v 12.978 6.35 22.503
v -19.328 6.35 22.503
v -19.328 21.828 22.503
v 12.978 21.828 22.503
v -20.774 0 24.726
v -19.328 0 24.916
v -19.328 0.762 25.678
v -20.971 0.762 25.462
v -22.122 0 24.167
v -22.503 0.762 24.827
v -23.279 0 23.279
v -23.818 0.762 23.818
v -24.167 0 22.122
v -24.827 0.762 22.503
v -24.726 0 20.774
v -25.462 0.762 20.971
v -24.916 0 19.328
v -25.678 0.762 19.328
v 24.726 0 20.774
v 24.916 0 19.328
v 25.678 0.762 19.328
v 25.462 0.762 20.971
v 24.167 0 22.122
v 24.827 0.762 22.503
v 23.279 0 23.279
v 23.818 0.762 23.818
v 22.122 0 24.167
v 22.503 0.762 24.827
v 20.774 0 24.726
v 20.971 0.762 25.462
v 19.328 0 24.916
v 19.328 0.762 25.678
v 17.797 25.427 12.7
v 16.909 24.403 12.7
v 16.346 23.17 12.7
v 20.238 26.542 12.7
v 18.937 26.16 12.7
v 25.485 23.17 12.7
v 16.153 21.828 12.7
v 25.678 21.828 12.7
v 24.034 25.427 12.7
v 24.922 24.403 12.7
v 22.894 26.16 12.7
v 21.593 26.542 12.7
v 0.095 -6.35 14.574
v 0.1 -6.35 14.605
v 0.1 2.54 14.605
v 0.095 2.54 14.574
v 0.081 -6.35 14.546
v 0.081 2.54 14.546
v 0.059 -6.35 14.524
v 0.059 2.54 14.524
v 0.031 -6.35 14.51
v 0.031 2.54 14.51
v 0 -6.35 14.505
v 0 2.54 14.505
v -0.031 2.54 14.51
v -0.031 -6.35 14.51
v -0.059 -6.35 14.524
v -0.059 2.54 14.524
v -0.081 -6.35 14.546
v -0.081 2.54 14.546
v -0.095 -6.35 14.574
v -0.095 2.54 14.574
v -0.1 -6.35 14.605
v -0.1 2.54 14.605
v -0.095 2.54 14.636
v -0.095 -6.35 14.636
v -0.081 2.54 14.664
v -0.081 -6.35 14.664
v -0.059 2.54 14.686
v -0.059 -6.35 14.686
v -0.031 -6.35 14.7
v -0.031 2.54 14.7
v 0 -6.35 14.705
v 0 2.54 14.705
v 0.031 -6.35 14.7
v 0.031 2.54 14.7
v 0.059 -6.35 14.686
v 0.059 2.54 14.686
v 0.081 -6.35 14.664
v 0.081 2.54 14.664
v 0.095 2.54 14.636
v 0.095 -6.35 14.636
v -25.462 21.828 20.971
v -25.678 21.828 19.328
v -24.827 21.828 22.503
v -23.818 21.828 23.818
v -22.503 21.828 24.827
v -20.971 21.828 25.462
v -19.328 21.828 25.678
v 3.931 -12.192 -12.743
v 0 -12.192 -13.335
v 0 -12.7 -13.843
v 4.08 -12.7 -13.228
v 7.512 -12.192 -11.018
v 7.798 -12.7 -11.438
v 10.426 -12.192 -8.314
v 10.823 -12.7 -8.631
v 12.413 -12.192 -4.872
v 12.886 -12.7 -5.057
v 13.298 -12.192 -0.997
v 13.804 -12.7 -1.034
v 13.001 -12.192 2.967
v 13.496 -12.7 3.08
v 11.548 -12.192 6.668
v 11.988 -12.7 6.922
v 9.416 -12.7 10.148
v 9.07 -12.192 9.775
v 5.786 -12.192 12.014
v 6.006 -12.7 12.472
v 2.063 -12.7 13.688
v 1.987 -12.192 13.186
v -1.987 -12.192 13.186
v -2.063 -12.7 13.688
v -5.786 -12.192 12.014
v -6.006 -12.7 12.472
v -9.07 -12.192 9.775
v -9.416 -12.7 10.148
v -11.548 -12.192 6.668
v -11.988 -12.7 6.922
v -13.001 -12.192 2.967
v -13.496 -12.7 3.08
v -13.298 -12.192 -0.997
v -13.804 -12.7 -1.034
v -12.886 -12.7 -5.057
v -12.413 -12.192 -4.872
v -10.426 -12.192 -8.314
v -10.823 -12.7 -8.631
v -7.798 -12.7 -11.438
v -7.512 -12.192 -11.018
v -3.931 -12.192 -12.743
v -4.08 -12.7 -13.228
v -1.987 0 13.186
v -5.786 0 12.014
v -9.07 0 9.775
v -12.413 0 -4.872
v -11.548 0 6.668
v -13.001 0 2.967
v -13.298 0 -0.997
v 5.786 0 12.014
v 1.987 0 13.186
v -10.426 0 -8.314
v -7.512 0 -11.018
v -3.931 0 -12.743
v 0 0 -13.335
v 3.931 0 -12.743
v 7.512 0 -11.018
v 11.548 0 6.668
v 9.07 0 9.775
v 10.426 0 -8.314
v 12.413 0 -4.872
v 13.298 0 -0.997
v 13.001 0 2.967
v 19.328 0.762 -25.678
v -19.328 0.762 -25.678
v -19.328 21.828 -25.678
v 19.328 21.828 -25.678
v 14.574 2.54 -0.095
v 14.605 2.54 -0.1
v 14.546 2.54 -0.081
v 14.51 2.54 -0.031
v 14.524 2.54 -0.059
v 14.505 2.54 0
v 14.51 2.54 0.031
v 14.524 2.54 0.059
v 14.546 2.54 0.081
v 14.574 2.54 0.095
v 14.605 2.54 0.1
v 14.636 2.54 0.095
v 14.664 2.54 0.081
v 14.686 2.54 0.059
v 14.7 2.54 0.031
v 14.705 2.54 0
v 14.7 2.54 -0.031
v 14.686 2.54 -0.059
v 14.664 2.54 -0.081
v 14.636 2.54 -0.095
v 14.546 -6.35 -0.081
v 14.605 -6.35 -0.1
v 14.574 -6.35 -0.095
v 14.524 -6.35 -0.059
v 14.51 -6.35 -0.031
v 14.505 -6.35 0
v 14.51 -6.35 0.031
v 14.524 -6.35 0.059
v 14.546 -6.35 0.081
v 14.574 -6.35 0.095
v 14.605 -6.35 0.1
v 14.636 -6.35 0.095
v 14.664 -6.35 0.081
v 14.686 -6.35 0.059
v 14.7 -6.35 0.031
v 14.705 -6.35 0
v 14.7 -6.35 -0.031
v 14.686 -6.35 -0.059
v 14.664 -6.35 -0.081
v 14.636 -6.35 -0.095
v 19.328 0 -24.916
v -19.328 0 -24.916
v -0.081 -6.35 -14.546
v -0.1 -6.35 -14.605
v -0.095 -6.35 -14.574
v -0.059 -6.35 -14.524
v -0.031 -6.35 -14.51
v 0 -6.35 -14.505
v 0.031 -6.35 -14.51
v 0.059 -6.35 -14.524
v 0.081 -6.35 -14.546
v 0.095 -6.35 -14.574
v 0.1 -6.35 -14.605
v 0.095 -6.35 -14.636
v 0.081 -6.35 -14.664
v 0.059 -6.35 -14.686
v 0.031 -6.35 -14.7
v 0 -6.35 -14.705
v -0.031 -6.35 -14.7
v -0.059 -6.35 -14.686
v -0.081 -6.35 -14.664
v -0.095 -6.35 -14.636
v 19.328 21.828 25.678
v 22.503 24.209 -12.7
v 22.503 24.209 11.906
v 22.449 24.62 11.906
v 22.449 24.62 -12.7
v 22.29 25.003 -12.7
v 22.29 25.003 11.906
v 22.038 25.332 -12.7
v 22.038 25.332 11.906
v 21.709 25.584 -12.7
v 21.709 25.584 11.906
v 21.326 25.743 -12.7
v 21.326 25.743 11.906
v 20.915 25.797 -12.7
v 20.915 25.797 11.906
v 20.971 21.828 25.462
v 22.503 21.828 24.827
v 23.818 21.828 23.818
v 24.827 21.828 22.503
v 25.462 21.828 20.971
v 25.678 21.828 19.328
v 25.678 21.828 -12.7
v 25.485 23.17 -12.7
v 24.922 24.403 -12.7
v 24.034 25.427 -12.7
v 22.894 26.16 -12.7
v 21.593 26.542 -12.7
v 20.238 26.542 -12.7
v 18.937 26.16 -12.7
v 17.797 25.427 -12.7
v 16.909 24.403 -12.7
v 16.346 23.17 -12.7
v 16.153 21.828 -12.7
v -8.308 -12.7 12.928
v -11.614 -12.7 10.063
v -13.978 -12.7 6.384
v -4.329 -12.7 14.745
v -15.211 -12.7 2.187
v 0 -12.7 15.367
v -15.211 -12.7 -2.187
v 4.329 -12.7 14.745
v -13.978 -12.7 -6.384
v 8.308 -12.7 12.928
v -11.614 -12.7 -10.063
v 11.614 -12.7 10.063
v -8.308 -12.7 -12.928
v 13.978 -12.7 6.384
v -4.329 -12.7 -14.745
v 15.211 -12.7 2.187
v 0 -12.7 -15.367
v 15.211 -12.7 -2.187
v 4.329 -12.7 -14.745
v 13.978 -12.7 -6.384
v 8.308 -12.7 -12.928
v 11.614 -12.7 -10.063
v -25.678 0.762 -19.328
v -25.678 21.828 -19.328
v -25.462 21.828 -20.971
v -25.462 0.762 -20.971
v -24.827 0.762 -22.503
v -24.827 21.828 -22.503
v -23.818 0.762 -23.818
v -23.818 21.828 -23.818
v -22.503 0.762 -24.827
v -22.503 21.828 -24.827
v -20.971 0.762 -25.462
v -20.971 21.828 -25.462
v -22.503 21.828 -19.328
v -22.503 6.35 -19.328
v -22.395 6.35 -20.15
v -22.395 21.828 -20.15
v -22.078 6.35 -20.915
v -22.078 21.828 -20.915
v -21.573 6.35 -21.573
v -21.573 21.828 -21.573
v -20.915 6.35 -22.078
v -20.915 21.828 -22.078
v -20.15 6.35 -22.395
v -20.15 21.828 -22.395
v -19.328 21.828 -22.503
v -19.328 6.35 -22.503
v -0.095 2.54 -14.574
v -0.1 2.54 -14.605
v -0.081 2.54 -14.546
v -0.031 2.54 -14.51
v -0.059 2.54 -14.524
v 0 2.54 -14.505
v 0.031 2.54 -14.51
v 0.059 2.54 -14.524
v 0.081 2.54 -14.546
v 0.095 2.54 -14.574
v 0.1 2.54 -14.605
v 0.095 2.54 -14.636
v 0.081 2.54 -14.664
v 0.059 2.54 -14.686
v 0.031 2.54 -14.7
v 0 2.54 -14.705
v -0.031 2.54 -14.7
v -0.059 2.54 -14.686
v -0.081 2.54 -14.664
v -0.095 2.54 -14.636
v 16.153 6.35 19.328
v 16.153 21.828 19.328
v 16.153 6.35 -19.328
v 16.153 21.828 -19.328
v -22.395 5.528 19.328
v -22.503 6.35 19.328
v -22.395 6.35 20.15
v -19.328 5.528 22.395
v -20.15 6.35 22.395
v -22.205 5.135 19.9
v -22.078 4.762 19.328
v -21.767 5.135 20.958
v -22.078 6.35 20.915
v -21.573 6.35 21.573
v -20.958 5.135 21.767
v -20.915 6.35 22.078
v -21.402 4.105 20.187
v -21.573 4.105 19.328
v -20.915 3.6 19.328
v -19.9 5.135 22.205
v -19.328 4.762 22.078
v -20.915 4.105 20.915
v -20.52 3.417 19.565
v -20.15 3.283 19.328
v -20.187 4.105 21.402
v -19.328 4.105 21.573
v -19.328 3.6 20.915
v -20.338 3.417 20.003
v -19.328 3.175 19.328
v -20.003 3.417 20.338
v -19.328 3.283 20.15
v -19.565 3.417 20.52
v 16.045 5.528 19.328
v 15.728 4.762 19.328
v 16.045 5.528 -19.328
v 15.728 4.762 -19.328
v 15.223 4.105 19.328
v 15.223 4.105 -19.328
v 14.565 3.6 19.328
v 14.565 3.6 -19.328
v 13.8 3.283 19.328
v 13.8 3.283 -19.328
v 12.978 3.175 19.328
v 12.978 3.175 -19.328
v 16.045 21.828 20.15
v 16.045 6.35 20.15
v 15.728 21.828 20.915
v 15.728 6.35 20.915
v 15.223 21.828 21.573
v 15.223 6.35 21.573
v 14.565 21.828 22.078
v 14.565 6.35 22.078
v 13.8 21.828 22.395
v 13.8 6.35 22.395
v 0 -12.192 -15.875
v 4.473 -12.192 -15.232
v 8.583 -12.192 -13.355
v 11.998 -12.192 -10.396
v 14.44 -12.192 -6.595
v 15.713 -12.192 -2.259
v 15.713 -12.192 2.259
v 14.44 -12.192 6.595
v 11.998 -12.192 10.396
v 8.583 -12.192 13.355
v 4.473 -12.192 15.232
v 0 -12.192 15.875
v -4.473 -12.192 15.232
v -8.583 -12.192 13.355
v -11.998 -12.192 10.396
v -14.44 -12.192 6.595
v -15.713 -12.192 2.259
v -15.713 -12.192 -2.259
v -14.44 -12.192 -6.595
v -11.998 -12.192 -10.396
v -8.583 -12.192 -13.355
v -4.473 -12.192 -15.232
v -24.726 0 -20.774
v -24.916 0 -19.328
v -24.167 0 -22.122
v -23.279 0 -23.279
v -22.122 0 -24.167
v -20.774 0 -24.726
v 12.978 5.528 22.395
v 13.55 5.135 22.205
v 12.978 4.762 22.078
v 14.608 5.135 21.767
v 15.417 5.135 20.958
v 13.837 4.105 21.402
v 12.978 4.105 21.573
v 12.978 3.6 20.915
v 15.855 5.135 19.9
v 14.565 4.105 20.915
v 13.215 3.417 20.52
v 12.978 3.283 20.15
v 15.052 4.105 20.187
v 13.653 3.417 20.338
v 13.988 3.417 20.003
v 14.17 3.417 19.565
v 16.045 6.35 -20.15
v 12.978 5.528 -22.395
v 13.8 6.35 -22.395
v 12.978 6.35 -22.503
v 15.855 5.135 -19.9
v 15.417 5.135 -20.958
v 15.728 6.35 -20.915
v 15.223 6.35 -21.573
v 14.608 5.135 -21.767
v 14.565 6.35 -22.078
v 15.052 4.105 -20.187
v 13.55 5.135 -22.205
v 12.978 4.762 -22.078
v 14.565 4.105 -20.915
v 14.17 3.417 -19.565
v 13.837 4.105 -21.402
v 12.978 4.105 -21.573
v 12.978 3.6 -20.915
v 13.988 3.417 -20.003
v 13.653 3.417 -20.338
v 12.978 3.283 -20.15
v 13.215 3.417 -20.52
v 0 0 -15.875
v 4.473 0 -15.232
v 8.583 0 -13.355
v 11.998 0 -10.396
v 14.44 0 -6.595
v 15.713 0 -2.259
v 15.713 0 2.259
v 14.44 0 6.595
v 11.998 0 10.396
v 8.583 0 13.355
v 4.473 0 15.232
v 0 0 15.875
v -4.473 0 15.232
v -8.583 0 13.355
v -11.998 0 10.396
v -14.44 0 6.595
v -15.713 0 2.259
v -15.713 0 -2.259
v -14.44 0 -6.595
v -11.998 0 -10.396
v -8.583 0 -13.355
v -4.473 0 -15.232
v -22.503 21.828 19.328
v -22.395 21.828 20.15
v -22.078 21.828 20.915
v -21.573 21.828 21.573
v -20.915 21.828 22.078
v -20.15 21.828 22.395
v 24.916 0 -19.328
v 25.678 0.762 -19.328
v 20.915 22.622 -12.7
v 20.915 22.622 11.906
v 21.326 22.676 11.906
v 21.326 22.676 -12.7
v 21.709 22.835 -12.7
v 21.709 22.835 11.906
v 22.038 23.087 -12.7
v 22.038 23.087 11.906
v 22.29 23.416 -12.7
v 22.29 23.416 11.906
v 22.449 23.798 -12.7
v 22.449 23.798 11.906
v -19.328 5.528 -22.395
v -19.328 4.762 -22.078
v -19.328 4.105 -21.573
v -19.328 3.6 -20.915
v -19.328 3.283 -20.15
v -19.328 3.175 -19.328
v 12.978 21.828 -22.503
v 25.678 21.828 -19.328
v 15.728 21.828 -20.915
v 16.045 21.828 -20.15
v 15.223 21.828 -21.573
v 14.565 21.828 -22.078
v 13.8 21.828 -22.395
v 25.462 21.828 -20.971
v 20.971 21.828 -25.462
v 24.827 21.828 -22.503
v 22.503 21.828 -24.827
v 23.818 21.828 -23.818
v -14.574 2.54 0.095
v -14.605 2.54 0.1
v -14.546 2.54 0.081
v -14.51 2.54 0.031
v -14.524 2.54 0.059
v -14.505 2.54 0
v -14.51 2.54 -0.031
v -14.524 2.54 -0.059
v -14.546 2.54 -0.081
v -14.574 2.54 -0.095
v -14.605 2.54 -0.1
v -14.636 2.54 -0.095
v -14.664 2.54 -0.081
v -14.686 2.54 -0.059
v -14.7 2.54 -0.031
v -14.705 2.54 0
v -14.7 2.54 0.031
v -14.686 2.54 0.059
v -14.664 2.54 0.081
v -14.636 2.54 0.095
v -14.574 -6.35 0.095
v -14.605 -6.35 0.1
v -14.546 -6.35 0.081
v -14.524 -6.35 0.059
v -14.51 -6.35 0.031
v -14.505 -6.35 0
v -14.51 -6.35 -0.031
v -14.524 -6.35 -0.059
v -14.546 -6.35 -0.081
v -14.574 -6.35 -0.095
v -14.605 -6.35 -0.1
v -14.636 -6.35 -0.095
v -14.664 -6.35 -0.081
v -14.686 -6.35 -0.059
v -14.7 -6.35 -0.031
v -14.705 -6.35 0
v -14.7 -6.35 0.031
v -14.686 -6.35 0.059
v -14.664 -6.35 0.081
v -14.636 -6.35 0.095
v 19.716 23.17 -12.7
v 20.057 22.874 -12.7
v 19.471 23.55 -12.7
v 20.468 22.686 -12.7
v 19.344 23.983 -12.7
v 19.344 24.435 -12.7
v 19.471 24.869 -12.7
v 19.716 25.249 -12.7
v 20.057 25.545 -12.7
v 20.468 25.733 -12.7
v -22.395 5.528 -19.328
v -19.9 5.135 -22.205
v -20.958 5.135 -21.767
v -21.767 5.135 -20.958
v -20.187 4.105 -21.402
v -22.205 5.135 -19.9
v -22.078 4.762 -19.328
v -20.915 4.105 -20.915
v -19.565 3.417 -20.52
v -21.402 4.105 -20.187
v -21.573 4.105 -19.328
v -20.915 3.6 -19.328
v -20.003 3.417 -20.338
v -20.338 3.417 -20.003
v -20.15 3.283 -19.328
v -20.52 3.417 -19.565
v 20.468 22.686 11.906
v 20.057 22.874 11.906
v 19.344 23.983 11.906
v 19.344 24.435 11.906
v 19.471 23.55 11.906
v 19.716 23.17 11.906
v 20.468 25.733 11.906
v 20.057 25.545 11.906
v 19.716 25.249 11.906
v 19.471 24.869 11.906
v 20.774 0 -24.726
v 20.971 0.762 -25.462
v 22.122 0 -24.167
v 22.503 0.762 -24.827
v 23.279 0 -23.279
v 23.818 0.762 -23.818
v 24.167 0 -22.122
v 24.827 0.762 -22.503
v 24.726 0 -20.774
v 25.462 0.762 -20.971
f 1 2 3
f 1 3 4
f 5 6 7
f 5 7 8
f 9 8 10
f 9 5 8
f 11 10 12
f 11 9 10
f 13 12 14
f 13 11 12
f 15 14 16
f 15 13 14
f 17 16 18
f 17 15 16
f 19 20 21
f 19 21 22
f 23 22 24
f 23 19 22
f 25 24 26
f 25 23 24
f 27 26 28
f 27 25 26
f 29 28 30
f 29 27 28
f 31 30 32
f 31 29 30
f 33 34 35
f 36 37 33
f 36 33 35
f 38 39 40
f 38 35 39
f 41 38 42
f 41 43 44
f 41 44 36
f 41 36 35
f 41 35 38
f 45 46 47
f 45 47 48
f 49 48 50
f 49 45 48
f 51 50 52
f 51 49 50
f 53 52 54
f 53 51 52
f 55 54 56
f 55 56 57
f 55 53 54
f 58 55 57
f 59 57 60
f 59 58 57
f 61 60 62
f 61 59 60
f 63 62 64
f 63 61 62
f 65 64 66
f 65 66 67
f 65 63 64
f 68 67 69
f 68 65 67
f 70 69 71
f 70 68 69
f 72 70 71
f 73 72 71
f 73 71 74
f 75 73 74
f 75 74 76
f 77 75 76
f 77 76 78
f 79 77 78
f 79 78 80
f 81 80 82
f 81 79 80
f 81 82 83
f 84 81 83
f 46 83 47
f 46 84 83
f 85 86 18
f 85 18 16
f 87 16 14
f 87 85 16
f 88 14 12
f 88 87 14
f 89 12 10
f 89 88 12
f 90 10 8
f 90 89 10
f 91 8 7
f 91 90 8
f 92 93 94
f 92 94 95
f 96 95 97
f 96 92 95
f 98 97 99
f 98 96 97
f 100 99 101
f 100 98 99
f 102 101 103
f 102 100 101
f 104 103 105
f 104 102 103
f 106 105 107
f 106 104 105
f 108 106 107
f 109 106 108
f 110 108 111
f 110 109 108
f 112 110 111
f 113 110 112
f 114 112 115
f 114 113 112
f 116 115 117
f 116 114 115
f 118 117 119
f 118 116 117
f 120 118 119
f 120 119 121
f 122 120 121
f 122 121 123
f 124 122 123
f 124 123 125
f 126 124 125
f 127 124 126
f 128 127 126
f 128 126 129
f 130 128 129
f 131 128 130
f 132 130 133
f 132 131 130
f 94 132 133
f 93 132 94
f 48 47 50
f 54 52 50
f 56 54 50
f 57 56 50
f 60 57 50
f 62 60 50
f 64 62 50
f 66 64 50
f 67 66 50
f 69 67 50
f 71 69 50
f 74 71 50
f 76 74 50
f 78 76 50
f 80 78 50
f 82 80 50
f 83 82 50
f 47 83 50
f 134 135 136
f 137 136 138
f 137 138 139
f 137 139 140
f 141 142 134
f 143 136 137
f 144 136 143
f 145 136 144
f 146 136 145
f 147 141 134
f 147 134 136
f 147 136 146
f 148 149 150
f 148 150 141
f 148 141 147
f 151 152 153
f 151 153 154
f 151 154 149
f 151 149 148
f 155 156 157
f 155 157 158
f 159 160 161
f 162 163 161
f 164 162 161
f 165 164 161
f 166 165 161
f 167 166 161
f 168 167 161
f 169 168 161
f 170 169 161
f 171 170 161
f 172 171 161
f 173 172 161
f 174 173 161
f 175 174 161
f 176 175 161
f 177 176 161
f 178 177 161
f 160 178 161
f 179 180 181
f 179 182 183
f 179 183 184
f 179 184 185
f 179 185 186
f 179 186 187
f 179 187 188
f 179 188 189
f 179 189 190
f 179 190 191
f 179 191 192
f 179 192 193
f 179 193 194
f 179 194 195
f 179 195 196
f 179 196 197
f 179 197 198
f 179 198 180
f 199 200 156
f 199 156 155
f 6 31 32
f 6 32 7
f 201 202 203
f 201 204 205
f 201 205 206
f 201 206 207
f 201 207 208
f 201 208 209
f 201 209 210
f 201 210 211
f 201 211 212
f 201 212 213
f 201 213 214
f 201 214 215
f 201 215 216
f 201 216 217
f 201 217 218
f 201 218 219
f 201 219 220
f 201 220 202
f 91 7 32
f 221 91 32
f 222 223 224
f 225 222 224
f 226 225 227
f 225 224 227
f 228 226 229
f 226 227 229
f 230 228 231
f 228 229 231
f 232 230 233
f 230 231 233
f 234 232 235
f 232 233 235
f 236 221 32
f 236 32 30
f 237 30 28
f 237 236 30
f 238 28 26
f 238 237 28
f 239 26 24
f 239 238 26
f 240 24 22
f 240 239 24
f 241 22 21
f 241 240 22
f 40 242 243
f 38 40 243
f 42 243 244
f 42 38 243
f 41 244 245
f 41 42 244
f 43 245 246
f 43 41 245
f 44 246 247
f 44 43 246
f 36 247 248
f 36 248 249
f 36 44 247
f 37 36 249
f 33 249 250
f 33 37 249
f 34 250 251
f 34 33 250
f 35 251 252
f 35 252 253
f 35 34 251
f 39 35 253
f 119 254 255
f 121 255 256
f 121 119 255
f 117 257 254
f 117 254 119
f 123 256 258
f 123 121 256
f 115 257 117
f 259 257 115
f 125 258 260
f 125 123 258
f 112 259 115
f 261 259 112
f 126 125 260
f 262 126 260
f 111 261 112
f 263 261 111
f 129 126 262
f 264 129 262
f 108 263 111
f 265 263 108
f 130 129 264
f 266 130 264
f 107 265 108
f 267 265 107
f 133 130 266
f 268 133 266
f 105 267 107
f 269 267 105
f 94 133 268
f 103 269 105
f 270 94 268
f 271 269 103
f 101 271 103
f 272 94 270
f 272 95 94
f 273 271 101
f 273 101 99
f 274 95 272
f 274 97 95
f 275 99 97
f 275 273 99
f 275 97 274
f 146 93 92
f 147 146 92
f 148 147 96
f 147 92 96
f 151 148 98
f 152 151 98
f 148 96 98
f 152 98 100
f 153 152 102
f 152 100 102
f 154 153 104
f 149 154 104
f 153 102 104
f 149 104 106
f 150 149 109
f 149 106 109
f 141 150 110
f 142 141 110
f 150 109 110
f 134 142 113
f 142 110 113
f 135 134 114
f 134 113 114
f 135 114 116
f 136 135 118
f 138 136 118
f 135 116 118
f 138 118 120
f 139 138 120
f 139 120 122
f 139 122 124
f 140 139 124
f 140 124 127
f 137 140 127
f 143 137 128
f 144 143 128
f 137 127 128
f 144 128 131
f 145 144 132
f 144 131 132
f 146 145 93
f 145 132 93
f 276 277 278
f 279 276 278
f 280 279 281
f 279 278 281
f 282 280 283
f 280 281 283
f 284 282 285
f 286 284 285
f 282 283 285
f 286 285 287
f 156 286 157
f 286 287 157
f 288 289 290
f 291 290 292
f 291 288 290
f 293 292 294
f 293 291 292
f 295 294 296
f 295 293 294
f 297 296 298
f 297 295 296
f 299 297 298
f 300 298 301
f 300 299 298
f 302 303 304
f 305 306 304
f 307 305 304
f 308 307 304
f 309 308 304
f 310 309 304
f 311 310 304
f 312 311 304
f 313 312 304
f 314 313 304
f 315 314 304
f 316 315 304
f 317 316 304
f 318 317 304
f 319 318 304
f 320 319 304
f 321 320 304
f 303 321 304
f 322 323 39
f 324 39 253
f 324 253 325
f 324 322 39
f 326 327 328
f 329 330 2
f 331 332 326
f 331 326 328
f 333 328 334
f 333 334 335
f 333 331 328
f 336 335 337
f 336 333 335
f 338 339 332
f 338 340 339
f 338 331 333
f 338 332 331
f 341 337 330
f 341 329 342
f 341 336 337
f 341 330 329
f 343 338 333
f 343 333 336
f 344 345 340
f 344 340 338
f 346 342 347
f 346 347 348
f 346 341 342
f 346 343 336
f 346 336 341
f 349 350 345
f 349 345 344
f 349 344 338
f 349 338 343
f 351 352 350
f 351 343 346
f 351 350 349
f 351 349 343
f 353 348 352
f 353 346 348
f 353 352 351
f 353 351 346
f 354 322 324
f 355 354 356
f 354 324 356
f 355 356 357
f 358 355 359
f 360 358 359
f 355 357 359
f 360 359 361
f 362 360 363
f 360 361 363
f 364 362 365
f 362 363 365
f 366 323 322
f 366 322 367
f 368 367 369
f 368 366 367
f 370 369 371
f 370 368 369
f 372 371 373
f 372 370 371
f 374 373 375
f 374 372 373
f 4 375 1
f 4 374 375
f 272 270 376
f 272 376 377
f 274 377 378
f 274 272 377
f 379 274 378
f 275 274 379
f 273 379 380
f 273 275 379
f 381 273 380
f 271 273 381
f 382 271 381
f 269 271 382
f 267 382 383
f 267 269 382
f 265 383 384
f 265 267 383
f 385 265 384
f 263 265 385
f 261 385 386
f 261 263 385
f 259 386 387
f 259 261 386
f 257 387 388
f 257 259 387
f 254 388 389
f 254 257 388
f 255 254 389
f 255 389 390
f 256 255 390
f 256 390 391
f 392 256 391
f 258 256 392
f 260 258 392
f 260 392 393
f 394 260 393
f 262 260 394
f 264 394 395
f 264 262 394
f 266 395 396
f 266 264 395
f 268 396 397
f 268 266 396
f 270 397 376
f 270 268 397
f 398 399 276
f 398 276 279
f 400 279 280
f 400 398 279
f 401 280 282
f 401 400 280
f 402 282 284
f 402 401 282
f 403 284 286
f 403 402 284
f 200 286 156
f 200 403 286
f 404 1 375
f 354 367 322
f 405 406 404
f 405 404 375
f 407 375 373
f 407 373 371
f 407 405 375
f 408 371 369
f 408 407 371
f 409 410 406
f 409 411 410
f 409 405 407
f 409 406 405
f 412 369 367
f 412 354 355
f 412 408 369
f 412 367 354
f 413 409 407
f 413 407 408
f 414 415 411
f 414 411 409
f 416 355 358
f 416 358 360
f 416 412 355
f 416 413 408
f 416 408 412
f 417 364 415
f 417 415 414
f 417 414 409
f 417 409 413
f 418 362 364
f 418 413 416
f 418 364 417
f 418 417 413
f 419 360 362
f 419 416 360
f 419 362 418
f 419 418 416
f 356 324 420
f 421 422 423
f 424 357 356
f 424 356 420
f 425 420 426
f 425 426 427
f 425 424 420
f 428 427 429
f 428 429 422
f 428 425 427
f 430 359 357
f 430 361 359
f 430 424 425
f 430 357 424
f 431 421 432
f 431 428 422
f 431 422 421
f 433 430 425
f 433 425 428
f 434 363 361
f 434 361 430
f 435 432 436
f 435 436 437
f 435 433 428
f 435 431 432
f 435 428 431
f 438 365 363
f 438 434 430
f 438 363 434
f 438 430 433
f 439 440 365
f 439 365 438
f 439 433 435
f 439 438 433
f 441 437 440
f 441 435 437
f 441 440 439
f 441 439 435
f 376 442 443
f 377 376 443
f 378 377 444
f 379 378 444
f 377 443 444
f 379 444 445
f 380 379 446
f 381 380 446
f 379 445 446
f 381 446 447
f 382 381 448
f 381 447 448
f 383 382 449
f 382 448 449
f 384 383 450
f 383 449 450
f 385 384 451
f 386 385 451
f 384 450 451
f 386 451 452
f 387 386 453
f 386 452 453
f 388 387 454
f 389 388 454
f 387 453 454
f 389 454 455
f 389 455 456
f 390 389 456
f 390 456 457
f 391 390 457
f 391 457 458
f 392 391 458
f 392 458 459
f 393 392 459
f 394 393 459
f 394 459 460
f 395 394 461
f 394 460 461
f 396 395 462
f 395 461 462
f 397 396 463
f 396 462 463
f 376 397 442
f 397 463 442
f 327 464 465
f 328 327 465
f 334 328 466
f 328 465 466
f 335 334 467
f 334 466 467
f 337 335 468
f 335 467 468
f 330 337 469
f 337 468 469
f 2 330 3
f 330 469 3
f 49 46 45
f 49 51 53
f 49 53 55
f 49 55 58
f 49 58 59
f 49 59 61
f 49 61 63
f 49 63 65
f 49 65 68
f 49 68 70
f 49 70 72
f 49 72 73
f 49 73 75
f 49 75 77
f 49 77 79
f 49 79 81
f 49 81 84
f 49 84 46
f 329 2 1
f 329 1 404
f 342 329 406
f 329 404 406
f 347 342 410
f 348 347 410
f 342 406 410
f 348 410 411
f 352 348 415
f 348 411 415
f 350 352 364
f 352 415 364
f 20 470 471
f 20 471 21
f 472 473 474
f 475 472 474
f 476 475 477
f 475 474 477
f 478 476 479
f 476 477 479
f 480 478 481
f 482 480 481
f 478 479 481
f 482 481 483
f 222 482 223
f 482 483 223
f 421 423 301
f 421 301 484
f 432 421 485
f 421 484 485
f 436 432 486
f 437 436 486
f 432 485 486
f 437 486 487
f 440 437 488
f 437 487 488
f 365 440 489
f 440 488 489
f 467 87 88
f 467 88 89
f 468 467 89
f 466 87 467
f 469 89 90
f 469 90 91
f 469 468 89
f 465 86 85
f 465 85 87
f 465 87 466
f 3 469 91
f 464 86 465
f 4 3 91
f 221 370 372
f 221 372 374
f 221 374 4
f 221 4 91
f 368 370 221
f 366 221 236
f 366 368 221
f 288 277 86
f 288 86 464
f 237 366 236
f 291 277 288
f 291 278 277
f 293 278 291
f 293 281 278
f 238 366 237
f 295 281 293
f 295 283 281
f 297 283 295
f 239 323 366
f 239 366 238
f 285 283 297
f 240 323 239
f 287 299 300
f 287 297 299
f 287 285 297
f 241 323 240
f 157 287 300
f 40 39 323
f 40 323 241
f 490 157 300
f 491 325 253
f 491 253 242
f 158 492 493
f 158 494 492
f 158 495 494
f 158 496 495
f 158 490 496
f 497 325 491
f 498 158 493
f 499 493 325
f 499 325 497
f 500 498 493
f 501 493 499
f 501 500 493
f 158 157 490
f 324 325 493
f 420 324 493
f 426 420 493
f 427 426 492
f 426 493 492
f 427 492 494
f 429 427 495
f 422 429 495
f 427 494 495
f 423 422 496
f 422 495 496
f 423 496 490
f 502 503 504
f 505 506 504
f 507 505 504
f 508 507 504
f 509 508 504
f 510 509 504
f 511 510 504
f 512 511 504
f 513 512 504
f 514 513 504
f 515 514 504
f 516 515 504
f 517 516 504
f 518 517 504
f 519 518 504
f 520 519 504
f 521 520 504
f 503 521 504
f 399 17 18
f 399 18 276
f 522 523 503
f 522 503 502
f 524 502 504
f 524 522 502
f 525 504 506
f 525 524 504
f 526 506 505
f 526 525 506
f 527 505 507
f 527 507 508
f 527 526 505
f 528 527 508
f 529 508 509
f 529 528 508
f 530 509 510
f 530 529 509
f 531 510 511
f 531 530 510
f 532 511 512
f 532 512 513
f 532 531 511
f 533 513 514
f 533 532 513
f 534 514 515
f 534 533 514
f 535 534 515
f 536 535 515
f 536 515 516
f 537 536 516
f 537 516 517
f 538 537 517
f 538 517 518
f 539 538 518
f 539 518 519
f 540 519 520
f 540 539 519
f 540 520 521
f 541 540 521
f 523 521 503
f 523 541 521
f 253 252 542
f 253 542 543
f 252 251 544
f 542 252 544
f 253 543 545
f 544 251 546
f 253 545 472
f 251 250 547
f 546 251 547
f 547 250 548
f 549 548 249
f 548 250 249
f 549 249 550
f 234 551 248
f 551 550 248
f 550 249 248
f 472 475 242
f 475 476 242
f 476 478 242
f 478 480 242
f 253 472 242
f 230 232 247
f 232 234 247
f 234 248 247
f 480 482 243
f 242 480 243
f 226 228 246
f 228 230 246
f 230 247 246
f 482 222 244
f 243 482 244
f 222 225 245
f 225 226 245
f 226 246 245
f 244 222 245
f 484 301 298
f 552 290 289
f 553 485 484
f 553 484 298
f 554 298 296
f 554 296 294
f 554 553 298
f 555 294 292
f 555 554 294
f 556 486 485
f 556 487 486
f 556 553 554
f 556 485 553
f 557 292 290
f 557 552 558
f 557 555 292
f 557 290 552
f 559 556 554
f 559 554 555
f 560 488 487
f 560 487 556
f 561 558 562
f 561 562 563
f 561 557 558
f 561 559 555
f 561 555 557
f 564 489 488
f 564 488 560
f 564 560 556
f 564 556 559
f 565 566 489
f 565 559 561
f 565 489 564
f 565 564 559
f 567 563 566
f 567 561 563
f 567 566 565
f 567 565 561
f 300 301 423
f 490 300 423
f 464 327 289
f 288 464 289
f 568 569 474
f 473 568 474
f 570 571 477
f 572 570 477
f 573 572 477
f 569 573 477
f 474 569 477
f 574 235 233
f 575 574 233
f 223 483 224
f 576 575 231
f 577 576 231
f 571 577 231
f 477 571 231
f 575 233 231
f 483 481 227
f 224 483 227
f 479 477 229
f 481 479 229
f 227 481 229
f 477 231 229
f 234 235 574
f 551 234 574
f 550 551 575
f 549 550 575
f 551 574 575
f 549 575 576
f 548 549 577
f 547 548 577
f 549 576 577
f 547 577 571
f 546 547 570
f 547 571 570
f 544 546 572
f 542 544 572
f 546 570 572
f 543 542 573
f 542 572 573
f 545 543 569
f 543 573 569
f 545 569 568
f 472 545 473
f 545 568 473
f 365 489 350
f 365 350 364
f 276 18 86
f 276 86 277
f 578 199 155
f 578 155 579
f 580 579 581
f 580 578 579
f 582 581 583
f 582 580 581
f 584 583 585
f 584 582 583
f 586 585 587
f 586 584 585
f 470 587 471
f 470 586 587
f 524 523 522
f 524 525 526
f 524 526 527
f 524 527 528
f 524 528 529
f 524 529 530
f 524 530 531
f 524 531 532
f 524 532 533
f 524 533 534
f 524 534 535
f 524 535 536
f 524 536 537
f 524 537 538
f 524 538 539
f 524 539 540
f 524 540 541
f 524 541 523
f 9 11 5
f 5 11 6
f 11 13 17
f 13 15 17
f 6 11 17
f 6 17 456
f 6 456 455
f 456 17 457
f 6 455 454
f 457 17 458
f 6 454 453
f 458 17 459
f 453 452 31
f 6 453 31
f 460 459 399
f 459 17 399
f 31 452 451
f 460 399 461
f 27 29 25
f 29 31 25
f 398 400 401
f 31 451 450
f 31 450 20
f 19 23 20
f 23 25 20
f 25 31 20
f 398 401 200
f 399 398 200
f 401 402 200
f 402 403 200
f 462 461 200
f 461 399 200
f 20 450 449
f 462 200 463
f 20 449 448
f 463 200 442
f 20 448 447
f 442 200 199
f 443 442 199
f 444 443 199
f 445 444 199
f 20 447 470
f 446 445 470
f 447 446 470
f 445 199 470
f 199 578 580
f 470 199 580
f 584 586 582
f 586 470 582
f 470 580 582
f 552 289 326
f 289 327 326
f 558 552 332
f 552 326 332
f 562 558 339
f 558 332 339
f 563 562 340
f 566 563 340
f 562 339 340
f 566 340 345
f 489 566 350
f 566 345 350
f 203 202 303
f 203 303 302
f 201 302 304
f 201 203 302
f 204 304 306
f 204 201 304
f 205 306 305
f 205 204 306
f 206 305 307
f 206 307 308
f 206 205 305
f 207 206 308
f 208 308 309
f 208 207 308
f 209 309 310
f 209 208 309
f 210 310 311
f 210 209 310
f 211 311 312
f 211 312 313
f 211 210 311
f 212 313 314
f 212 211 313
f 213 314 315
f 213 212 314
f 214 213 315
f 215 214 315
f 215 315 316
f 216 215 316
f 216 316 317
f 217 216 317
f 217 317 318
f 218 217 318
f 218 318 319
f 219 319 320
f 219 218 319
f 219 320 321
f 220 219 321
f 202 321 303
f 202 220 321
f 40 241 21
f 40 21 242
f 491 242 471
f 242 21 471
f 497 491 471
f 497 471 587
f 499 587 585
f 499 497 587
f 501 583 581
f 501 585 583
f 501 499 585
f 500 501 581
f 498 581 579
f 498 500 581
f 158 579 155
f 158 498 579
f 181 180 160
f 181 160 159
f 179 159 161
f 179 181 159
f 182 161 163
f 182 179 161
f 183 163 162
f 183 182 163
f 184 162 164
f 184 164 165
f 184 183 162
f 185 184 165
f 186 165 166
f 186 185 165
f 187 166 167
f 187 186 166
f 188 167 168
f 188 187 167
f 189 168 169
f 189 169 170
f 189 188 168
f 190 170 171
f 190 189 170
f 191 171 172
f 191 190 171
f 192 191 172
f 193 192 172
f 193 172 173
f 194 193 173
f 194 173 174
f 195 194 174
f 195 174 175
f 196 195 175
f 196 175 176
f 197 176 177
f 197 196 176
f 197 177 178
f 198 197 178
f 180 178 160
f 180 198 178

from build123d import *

# Parameters (mm, degrees)
SKETCH1_W           = 51.355839692
SKETCH1_H           = 51.355839692
BOSS_EXTRUDE1_DEPTH = 21.828125
FILLET1_R           = 6.35
SHELL1_T            = -3.175
SKETCH2_R           = 15.875
BOSS_EXTRUDE2_DEPTH = 12.7
SKETCH3_W           = 6.35
SKETCH3_H           = 45.005839692
BOSS_EXTRUDE3_DEPTH = 18.653125
SKETCH4_R           = 4.7625
BOSS_EXTRUDE4_DEPTH = 12.7
CUT_EXTRUDE1_DEPTH  = 25.4
SKETCH6_R           = 1.966828055
BOSS_EXTRUDE5_DEPTH = 0.79375
FILLET2_R           = 3.175
FILLET3_R           = 3.175
SKETCH8_R           = 13.335
CUT_EXTRUDE2_DEPTH  = 12.7
CUT_EXTRUDE3_START  = -6.35
SKETCH9_R           = 0.1
CUT_EXTRUDE3_DEPTH  = 8.89
CIRPATTERN1_COUNT   = 4
CHAMFER4_SIZE       = 0.762
CHAMFER5_SIZE       = 0.508


with BuildPart() as part:
    # Sketch1 → Boss-Extrude1 (new body)
    with BuildSketch(Plane(origin=(0, 0, 0), x_dir=(1, 0, 0), z_dir=(0, 1, 0))):
        Rectangle(SKETCH1_W, SKETCH1_H)
    extrude(amount=BOSS_EXTRUDE1_DEPTH)

    # Fillet1
    fillet1_edges = [part.edges().sort_by_distance(p)[0] for p in [
        (25.677919846, 10.9140625, -25.677919846),
        (25.677919846, 10.9140625, 25.677919846),
        (-25.677919846, 10.9140625, 25.677919846),
        (-25.677919846, 10.9140625, -25.677919846),
    ]]
    fillet(fillet1_edges, radius=FILLET1_R)

    # Shell1
    shell1_openings = [part.faces().sort_by_distance(p)[0] for p in [
        (0, 21.828125, 0),
    ]]
    offset(amount=SHELL1_T, openings=shell1_openings, kind=Kind.INTERSECTION)

    # Sketch2 → Boss-Extrude2 (add)
    with BuildSketch(Plane.XZ):
        with Locations(Location((0, 0, 0), (0, 0, 270))):
            Circle(SKETCH2_R)
    extrude(amount=BOSS_EXTRUDE2_DEPTH)

    # Sketch3 → Boss-Extrude3 (add)
    with BuildSketch(Plane(origin=(0, 3.175, 0), x_dir=(1, 0, 0), z_dir=(0, 1, 0))):
        with Locations((19.327919846, 0)):
            Rectangle(SKETCH3_W, SKETCH3_H)
    extrude(amount=BOSS_EXTRUDE3_DEPTH)

    # Sketch4 → Boss-Extrude4 (add, symmetric)
    with BuildSketch(Plane.XY):
        with Locations((20.915419846, 21.828125)):
            Circle(SKETCH4_R)
    extrude(amount=BOSS_EXTRUDE4_DEPTH, both=True)

    # Sketch5 → Cut-Extrude1 (cut)
    with BuildSketch(Plane.XY.offset(12.7)):
        with BuildLine():
            ThreePointArc((22.502919846, 24.209375), (22.037951861, 25.331907015), (20.915419846, 25.796875))
            Line((20.915419846, 25.796875), (20.915419846, 22.621875))
            ThreePointArc((20.915419846, 22.621875), (22.037951861, 23.086842985), (22.502919846, 24.209375))
        make_face()
        with BuildLine():
            Line((20.915419846, 22.621875), (20.915419846, 25.796875))
            ThreePointArc((20.915419846, 25.796875), (19.327919846, 24.209375), (20.915419846, 22.621875))
        make_face()
    extrude(amount=-CUT_EXTRUDE1_DEPTH, mode=Mode.SUBTRACT)

    # Sketch6 → Boss-Extrude5 (add)
    with BuildSketch(Plane.XY.offset(12.7)):
        with Locations((20.915419846, 24.209375)):
            Circle(SKETCH6_R)
    extrude(amount=-BOSS_EXTRUDE5_DEPTH)

    # Fillet2
    fillet2_edges = [part.edges().sort_by_distance(p)[0] for p in [
        (16.152919846, 12.5015625, 22.502919846),
        (16.152919846, 12.5015625, -22.502919846),
    ]]
    fillet(fillet2_edges, radius=FILLET2_R)

    # Fillet3
    fillet3_edges = [part.edges().sort_by_distance(p)[0] for p in [
        (16.152919846, 3.175, 0),
        (-3.175, 3.175, -22.502919846),
        (15.222983876, 3.175, -21.572983876),
        (15.222983876, 3.175, 21.572983876),
        (-22.502919846, 3.175, 0),
        (-3.175, 3.175, 22.502919846),
        (-21.572983876, 3.175, 21.572983876),
        (-21.572983876, 3.175, -21.572983876),
    ]]
    fillet(fillet3_edges, radius=FILLET3_R)

    # Sketch8 → Cut-Extrude2 (cut)
    with BuildSketch(Plane.XZ.offset(12.7)):
        with Locations(Location((0, 0, 0), (0, 0, 270))):
            Circle(SKETCH8_R)
    extrude(amount=-CUT_EXTRUDE2_DEPTH, mode=Mode.SUBTRACT)

    # Sketch9 → Cut-Extrude3 (cut)
    with BuildSketch(Plane(origin=(0, 0, 0), x_dir=(1, 0, 0), z_dir=(0, 1, 0)).offset(CUT_EXTRUDE3_START)):
        with Locations(Location((-14.605, 0, 0), (0, 0, 270))):
            Circle(SKETCH9_R)
    cut_extrude3 = extrude(amount=CUT_EXTRUDE3_DEPTH, mode=Mode.SUBTRACT)

    # CirPattern1: Cut-Extrude3 ×4 about axis
    cirpattern1_axis = Axis((0, 0, 0), (0, 1, 0))
    for i in range(1, CIRPATTERN1_COUNT):
        add(cut_extrude3.rotate(cirpattern1_axis, i * 360 / CIRPATTERN1_COUNT), mode=Mode.SUBTRACT)

    # Chamfer4
    chamfer4_edges = [part.edges().sort_by_distance(p)[0] for p in [
        (0, 0, -25.677919846),
        (25.677919846, 0, 0),
        (0, 0, 25.677919846),
        (-25.677919846, 0, 0),
        (-23.818047907, 0, -23.818047907),
        (-23.818047907, 0, 23.818047907),
        (23.818047907, 0, 23.818047907),
        (23.818047907, 0, -23.818047907),
    ]]
    chamfer(chamfer4_edges, length=CHAMFER4_SIZE)

    # Chamfer5
    chamfer5_edges = [part.edges().sort_by_distance(p)[0] for p in [
        (0, -12.7, 13.335),
        (0, -12.7, 15.875),
    ]]
    chamfer(chamfer5_edges, length=CHAMFER5_SIZE)


solid = part.part
